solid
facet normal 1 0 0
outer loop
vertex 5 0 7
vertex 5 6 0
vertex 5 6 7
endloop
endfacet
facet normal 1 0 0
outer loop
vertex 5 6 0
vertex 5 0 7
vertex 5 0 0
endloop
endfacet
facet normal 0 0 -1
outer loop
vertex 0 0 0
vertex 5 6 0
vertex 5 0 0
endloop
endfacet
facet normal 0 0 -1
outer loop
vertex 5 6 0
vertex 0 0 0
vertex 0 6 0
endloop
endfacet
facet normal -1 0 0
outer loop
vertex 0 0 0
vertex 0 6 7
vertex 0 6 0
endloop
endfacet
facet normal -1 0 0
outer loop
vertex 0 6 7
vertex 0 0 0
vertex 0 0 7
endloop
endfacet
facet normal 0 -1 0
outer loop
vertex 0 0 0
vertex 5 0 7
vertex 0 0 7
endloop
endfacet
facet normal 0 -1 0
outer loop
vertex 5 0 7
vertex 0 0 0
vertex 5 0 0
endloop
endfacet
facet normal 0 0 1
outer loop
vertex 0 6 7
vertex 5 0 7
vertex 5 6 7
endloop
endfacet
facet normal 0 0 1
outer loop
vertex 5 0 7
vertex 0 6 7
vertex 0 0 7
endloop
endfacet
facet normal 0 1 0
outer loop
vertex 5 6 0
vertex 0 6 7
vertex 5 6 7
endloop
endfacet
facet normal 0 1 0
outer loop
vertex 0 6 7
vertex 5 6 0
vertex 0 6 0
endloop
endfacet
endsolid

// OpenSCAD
translate([2.5, 1.5, 1.0]) color([0.799945824478888, 0.5165278007752844, 0.9155142682747232]) cube([5, 3, 2], center=true);
translate([2.5, 1.5, 3.0]) color([0.06635468620874474, 0.13049414784187097, 0.3004482911175872]) cube([5, 3, 2], center=true);
translate([2.5, 1.0, 5.5]) color([0.7588987264331779, 0.4485890964462933, 0.8619033855251227]) cube([5, 2, 3], center=true);
translate([2.5, 3.0, 5.5]) color([0.8006454493762514, 0.8686955098516022, 0.4607350972935428]) cube([5, 2, 3], center=true);
translate([2.5, 4.5, 1.0]) color([0.37132186818867685, 0.38223256097056324, 0.5298076607467874]) cube([5, 3, 2], center=true);
translate([2.5, 4.5, 3.0]) color([0.033618014856222844, 0.09064689039119589, 0.7941451579713075]) cube([5, 3, 2], center=true);
translate([2.5, 5.0, 5.5]) color([0.5179983582932232, 0.6001422851572377, 0.07635810782734587]) cube([5, 2, 3], center=true);
